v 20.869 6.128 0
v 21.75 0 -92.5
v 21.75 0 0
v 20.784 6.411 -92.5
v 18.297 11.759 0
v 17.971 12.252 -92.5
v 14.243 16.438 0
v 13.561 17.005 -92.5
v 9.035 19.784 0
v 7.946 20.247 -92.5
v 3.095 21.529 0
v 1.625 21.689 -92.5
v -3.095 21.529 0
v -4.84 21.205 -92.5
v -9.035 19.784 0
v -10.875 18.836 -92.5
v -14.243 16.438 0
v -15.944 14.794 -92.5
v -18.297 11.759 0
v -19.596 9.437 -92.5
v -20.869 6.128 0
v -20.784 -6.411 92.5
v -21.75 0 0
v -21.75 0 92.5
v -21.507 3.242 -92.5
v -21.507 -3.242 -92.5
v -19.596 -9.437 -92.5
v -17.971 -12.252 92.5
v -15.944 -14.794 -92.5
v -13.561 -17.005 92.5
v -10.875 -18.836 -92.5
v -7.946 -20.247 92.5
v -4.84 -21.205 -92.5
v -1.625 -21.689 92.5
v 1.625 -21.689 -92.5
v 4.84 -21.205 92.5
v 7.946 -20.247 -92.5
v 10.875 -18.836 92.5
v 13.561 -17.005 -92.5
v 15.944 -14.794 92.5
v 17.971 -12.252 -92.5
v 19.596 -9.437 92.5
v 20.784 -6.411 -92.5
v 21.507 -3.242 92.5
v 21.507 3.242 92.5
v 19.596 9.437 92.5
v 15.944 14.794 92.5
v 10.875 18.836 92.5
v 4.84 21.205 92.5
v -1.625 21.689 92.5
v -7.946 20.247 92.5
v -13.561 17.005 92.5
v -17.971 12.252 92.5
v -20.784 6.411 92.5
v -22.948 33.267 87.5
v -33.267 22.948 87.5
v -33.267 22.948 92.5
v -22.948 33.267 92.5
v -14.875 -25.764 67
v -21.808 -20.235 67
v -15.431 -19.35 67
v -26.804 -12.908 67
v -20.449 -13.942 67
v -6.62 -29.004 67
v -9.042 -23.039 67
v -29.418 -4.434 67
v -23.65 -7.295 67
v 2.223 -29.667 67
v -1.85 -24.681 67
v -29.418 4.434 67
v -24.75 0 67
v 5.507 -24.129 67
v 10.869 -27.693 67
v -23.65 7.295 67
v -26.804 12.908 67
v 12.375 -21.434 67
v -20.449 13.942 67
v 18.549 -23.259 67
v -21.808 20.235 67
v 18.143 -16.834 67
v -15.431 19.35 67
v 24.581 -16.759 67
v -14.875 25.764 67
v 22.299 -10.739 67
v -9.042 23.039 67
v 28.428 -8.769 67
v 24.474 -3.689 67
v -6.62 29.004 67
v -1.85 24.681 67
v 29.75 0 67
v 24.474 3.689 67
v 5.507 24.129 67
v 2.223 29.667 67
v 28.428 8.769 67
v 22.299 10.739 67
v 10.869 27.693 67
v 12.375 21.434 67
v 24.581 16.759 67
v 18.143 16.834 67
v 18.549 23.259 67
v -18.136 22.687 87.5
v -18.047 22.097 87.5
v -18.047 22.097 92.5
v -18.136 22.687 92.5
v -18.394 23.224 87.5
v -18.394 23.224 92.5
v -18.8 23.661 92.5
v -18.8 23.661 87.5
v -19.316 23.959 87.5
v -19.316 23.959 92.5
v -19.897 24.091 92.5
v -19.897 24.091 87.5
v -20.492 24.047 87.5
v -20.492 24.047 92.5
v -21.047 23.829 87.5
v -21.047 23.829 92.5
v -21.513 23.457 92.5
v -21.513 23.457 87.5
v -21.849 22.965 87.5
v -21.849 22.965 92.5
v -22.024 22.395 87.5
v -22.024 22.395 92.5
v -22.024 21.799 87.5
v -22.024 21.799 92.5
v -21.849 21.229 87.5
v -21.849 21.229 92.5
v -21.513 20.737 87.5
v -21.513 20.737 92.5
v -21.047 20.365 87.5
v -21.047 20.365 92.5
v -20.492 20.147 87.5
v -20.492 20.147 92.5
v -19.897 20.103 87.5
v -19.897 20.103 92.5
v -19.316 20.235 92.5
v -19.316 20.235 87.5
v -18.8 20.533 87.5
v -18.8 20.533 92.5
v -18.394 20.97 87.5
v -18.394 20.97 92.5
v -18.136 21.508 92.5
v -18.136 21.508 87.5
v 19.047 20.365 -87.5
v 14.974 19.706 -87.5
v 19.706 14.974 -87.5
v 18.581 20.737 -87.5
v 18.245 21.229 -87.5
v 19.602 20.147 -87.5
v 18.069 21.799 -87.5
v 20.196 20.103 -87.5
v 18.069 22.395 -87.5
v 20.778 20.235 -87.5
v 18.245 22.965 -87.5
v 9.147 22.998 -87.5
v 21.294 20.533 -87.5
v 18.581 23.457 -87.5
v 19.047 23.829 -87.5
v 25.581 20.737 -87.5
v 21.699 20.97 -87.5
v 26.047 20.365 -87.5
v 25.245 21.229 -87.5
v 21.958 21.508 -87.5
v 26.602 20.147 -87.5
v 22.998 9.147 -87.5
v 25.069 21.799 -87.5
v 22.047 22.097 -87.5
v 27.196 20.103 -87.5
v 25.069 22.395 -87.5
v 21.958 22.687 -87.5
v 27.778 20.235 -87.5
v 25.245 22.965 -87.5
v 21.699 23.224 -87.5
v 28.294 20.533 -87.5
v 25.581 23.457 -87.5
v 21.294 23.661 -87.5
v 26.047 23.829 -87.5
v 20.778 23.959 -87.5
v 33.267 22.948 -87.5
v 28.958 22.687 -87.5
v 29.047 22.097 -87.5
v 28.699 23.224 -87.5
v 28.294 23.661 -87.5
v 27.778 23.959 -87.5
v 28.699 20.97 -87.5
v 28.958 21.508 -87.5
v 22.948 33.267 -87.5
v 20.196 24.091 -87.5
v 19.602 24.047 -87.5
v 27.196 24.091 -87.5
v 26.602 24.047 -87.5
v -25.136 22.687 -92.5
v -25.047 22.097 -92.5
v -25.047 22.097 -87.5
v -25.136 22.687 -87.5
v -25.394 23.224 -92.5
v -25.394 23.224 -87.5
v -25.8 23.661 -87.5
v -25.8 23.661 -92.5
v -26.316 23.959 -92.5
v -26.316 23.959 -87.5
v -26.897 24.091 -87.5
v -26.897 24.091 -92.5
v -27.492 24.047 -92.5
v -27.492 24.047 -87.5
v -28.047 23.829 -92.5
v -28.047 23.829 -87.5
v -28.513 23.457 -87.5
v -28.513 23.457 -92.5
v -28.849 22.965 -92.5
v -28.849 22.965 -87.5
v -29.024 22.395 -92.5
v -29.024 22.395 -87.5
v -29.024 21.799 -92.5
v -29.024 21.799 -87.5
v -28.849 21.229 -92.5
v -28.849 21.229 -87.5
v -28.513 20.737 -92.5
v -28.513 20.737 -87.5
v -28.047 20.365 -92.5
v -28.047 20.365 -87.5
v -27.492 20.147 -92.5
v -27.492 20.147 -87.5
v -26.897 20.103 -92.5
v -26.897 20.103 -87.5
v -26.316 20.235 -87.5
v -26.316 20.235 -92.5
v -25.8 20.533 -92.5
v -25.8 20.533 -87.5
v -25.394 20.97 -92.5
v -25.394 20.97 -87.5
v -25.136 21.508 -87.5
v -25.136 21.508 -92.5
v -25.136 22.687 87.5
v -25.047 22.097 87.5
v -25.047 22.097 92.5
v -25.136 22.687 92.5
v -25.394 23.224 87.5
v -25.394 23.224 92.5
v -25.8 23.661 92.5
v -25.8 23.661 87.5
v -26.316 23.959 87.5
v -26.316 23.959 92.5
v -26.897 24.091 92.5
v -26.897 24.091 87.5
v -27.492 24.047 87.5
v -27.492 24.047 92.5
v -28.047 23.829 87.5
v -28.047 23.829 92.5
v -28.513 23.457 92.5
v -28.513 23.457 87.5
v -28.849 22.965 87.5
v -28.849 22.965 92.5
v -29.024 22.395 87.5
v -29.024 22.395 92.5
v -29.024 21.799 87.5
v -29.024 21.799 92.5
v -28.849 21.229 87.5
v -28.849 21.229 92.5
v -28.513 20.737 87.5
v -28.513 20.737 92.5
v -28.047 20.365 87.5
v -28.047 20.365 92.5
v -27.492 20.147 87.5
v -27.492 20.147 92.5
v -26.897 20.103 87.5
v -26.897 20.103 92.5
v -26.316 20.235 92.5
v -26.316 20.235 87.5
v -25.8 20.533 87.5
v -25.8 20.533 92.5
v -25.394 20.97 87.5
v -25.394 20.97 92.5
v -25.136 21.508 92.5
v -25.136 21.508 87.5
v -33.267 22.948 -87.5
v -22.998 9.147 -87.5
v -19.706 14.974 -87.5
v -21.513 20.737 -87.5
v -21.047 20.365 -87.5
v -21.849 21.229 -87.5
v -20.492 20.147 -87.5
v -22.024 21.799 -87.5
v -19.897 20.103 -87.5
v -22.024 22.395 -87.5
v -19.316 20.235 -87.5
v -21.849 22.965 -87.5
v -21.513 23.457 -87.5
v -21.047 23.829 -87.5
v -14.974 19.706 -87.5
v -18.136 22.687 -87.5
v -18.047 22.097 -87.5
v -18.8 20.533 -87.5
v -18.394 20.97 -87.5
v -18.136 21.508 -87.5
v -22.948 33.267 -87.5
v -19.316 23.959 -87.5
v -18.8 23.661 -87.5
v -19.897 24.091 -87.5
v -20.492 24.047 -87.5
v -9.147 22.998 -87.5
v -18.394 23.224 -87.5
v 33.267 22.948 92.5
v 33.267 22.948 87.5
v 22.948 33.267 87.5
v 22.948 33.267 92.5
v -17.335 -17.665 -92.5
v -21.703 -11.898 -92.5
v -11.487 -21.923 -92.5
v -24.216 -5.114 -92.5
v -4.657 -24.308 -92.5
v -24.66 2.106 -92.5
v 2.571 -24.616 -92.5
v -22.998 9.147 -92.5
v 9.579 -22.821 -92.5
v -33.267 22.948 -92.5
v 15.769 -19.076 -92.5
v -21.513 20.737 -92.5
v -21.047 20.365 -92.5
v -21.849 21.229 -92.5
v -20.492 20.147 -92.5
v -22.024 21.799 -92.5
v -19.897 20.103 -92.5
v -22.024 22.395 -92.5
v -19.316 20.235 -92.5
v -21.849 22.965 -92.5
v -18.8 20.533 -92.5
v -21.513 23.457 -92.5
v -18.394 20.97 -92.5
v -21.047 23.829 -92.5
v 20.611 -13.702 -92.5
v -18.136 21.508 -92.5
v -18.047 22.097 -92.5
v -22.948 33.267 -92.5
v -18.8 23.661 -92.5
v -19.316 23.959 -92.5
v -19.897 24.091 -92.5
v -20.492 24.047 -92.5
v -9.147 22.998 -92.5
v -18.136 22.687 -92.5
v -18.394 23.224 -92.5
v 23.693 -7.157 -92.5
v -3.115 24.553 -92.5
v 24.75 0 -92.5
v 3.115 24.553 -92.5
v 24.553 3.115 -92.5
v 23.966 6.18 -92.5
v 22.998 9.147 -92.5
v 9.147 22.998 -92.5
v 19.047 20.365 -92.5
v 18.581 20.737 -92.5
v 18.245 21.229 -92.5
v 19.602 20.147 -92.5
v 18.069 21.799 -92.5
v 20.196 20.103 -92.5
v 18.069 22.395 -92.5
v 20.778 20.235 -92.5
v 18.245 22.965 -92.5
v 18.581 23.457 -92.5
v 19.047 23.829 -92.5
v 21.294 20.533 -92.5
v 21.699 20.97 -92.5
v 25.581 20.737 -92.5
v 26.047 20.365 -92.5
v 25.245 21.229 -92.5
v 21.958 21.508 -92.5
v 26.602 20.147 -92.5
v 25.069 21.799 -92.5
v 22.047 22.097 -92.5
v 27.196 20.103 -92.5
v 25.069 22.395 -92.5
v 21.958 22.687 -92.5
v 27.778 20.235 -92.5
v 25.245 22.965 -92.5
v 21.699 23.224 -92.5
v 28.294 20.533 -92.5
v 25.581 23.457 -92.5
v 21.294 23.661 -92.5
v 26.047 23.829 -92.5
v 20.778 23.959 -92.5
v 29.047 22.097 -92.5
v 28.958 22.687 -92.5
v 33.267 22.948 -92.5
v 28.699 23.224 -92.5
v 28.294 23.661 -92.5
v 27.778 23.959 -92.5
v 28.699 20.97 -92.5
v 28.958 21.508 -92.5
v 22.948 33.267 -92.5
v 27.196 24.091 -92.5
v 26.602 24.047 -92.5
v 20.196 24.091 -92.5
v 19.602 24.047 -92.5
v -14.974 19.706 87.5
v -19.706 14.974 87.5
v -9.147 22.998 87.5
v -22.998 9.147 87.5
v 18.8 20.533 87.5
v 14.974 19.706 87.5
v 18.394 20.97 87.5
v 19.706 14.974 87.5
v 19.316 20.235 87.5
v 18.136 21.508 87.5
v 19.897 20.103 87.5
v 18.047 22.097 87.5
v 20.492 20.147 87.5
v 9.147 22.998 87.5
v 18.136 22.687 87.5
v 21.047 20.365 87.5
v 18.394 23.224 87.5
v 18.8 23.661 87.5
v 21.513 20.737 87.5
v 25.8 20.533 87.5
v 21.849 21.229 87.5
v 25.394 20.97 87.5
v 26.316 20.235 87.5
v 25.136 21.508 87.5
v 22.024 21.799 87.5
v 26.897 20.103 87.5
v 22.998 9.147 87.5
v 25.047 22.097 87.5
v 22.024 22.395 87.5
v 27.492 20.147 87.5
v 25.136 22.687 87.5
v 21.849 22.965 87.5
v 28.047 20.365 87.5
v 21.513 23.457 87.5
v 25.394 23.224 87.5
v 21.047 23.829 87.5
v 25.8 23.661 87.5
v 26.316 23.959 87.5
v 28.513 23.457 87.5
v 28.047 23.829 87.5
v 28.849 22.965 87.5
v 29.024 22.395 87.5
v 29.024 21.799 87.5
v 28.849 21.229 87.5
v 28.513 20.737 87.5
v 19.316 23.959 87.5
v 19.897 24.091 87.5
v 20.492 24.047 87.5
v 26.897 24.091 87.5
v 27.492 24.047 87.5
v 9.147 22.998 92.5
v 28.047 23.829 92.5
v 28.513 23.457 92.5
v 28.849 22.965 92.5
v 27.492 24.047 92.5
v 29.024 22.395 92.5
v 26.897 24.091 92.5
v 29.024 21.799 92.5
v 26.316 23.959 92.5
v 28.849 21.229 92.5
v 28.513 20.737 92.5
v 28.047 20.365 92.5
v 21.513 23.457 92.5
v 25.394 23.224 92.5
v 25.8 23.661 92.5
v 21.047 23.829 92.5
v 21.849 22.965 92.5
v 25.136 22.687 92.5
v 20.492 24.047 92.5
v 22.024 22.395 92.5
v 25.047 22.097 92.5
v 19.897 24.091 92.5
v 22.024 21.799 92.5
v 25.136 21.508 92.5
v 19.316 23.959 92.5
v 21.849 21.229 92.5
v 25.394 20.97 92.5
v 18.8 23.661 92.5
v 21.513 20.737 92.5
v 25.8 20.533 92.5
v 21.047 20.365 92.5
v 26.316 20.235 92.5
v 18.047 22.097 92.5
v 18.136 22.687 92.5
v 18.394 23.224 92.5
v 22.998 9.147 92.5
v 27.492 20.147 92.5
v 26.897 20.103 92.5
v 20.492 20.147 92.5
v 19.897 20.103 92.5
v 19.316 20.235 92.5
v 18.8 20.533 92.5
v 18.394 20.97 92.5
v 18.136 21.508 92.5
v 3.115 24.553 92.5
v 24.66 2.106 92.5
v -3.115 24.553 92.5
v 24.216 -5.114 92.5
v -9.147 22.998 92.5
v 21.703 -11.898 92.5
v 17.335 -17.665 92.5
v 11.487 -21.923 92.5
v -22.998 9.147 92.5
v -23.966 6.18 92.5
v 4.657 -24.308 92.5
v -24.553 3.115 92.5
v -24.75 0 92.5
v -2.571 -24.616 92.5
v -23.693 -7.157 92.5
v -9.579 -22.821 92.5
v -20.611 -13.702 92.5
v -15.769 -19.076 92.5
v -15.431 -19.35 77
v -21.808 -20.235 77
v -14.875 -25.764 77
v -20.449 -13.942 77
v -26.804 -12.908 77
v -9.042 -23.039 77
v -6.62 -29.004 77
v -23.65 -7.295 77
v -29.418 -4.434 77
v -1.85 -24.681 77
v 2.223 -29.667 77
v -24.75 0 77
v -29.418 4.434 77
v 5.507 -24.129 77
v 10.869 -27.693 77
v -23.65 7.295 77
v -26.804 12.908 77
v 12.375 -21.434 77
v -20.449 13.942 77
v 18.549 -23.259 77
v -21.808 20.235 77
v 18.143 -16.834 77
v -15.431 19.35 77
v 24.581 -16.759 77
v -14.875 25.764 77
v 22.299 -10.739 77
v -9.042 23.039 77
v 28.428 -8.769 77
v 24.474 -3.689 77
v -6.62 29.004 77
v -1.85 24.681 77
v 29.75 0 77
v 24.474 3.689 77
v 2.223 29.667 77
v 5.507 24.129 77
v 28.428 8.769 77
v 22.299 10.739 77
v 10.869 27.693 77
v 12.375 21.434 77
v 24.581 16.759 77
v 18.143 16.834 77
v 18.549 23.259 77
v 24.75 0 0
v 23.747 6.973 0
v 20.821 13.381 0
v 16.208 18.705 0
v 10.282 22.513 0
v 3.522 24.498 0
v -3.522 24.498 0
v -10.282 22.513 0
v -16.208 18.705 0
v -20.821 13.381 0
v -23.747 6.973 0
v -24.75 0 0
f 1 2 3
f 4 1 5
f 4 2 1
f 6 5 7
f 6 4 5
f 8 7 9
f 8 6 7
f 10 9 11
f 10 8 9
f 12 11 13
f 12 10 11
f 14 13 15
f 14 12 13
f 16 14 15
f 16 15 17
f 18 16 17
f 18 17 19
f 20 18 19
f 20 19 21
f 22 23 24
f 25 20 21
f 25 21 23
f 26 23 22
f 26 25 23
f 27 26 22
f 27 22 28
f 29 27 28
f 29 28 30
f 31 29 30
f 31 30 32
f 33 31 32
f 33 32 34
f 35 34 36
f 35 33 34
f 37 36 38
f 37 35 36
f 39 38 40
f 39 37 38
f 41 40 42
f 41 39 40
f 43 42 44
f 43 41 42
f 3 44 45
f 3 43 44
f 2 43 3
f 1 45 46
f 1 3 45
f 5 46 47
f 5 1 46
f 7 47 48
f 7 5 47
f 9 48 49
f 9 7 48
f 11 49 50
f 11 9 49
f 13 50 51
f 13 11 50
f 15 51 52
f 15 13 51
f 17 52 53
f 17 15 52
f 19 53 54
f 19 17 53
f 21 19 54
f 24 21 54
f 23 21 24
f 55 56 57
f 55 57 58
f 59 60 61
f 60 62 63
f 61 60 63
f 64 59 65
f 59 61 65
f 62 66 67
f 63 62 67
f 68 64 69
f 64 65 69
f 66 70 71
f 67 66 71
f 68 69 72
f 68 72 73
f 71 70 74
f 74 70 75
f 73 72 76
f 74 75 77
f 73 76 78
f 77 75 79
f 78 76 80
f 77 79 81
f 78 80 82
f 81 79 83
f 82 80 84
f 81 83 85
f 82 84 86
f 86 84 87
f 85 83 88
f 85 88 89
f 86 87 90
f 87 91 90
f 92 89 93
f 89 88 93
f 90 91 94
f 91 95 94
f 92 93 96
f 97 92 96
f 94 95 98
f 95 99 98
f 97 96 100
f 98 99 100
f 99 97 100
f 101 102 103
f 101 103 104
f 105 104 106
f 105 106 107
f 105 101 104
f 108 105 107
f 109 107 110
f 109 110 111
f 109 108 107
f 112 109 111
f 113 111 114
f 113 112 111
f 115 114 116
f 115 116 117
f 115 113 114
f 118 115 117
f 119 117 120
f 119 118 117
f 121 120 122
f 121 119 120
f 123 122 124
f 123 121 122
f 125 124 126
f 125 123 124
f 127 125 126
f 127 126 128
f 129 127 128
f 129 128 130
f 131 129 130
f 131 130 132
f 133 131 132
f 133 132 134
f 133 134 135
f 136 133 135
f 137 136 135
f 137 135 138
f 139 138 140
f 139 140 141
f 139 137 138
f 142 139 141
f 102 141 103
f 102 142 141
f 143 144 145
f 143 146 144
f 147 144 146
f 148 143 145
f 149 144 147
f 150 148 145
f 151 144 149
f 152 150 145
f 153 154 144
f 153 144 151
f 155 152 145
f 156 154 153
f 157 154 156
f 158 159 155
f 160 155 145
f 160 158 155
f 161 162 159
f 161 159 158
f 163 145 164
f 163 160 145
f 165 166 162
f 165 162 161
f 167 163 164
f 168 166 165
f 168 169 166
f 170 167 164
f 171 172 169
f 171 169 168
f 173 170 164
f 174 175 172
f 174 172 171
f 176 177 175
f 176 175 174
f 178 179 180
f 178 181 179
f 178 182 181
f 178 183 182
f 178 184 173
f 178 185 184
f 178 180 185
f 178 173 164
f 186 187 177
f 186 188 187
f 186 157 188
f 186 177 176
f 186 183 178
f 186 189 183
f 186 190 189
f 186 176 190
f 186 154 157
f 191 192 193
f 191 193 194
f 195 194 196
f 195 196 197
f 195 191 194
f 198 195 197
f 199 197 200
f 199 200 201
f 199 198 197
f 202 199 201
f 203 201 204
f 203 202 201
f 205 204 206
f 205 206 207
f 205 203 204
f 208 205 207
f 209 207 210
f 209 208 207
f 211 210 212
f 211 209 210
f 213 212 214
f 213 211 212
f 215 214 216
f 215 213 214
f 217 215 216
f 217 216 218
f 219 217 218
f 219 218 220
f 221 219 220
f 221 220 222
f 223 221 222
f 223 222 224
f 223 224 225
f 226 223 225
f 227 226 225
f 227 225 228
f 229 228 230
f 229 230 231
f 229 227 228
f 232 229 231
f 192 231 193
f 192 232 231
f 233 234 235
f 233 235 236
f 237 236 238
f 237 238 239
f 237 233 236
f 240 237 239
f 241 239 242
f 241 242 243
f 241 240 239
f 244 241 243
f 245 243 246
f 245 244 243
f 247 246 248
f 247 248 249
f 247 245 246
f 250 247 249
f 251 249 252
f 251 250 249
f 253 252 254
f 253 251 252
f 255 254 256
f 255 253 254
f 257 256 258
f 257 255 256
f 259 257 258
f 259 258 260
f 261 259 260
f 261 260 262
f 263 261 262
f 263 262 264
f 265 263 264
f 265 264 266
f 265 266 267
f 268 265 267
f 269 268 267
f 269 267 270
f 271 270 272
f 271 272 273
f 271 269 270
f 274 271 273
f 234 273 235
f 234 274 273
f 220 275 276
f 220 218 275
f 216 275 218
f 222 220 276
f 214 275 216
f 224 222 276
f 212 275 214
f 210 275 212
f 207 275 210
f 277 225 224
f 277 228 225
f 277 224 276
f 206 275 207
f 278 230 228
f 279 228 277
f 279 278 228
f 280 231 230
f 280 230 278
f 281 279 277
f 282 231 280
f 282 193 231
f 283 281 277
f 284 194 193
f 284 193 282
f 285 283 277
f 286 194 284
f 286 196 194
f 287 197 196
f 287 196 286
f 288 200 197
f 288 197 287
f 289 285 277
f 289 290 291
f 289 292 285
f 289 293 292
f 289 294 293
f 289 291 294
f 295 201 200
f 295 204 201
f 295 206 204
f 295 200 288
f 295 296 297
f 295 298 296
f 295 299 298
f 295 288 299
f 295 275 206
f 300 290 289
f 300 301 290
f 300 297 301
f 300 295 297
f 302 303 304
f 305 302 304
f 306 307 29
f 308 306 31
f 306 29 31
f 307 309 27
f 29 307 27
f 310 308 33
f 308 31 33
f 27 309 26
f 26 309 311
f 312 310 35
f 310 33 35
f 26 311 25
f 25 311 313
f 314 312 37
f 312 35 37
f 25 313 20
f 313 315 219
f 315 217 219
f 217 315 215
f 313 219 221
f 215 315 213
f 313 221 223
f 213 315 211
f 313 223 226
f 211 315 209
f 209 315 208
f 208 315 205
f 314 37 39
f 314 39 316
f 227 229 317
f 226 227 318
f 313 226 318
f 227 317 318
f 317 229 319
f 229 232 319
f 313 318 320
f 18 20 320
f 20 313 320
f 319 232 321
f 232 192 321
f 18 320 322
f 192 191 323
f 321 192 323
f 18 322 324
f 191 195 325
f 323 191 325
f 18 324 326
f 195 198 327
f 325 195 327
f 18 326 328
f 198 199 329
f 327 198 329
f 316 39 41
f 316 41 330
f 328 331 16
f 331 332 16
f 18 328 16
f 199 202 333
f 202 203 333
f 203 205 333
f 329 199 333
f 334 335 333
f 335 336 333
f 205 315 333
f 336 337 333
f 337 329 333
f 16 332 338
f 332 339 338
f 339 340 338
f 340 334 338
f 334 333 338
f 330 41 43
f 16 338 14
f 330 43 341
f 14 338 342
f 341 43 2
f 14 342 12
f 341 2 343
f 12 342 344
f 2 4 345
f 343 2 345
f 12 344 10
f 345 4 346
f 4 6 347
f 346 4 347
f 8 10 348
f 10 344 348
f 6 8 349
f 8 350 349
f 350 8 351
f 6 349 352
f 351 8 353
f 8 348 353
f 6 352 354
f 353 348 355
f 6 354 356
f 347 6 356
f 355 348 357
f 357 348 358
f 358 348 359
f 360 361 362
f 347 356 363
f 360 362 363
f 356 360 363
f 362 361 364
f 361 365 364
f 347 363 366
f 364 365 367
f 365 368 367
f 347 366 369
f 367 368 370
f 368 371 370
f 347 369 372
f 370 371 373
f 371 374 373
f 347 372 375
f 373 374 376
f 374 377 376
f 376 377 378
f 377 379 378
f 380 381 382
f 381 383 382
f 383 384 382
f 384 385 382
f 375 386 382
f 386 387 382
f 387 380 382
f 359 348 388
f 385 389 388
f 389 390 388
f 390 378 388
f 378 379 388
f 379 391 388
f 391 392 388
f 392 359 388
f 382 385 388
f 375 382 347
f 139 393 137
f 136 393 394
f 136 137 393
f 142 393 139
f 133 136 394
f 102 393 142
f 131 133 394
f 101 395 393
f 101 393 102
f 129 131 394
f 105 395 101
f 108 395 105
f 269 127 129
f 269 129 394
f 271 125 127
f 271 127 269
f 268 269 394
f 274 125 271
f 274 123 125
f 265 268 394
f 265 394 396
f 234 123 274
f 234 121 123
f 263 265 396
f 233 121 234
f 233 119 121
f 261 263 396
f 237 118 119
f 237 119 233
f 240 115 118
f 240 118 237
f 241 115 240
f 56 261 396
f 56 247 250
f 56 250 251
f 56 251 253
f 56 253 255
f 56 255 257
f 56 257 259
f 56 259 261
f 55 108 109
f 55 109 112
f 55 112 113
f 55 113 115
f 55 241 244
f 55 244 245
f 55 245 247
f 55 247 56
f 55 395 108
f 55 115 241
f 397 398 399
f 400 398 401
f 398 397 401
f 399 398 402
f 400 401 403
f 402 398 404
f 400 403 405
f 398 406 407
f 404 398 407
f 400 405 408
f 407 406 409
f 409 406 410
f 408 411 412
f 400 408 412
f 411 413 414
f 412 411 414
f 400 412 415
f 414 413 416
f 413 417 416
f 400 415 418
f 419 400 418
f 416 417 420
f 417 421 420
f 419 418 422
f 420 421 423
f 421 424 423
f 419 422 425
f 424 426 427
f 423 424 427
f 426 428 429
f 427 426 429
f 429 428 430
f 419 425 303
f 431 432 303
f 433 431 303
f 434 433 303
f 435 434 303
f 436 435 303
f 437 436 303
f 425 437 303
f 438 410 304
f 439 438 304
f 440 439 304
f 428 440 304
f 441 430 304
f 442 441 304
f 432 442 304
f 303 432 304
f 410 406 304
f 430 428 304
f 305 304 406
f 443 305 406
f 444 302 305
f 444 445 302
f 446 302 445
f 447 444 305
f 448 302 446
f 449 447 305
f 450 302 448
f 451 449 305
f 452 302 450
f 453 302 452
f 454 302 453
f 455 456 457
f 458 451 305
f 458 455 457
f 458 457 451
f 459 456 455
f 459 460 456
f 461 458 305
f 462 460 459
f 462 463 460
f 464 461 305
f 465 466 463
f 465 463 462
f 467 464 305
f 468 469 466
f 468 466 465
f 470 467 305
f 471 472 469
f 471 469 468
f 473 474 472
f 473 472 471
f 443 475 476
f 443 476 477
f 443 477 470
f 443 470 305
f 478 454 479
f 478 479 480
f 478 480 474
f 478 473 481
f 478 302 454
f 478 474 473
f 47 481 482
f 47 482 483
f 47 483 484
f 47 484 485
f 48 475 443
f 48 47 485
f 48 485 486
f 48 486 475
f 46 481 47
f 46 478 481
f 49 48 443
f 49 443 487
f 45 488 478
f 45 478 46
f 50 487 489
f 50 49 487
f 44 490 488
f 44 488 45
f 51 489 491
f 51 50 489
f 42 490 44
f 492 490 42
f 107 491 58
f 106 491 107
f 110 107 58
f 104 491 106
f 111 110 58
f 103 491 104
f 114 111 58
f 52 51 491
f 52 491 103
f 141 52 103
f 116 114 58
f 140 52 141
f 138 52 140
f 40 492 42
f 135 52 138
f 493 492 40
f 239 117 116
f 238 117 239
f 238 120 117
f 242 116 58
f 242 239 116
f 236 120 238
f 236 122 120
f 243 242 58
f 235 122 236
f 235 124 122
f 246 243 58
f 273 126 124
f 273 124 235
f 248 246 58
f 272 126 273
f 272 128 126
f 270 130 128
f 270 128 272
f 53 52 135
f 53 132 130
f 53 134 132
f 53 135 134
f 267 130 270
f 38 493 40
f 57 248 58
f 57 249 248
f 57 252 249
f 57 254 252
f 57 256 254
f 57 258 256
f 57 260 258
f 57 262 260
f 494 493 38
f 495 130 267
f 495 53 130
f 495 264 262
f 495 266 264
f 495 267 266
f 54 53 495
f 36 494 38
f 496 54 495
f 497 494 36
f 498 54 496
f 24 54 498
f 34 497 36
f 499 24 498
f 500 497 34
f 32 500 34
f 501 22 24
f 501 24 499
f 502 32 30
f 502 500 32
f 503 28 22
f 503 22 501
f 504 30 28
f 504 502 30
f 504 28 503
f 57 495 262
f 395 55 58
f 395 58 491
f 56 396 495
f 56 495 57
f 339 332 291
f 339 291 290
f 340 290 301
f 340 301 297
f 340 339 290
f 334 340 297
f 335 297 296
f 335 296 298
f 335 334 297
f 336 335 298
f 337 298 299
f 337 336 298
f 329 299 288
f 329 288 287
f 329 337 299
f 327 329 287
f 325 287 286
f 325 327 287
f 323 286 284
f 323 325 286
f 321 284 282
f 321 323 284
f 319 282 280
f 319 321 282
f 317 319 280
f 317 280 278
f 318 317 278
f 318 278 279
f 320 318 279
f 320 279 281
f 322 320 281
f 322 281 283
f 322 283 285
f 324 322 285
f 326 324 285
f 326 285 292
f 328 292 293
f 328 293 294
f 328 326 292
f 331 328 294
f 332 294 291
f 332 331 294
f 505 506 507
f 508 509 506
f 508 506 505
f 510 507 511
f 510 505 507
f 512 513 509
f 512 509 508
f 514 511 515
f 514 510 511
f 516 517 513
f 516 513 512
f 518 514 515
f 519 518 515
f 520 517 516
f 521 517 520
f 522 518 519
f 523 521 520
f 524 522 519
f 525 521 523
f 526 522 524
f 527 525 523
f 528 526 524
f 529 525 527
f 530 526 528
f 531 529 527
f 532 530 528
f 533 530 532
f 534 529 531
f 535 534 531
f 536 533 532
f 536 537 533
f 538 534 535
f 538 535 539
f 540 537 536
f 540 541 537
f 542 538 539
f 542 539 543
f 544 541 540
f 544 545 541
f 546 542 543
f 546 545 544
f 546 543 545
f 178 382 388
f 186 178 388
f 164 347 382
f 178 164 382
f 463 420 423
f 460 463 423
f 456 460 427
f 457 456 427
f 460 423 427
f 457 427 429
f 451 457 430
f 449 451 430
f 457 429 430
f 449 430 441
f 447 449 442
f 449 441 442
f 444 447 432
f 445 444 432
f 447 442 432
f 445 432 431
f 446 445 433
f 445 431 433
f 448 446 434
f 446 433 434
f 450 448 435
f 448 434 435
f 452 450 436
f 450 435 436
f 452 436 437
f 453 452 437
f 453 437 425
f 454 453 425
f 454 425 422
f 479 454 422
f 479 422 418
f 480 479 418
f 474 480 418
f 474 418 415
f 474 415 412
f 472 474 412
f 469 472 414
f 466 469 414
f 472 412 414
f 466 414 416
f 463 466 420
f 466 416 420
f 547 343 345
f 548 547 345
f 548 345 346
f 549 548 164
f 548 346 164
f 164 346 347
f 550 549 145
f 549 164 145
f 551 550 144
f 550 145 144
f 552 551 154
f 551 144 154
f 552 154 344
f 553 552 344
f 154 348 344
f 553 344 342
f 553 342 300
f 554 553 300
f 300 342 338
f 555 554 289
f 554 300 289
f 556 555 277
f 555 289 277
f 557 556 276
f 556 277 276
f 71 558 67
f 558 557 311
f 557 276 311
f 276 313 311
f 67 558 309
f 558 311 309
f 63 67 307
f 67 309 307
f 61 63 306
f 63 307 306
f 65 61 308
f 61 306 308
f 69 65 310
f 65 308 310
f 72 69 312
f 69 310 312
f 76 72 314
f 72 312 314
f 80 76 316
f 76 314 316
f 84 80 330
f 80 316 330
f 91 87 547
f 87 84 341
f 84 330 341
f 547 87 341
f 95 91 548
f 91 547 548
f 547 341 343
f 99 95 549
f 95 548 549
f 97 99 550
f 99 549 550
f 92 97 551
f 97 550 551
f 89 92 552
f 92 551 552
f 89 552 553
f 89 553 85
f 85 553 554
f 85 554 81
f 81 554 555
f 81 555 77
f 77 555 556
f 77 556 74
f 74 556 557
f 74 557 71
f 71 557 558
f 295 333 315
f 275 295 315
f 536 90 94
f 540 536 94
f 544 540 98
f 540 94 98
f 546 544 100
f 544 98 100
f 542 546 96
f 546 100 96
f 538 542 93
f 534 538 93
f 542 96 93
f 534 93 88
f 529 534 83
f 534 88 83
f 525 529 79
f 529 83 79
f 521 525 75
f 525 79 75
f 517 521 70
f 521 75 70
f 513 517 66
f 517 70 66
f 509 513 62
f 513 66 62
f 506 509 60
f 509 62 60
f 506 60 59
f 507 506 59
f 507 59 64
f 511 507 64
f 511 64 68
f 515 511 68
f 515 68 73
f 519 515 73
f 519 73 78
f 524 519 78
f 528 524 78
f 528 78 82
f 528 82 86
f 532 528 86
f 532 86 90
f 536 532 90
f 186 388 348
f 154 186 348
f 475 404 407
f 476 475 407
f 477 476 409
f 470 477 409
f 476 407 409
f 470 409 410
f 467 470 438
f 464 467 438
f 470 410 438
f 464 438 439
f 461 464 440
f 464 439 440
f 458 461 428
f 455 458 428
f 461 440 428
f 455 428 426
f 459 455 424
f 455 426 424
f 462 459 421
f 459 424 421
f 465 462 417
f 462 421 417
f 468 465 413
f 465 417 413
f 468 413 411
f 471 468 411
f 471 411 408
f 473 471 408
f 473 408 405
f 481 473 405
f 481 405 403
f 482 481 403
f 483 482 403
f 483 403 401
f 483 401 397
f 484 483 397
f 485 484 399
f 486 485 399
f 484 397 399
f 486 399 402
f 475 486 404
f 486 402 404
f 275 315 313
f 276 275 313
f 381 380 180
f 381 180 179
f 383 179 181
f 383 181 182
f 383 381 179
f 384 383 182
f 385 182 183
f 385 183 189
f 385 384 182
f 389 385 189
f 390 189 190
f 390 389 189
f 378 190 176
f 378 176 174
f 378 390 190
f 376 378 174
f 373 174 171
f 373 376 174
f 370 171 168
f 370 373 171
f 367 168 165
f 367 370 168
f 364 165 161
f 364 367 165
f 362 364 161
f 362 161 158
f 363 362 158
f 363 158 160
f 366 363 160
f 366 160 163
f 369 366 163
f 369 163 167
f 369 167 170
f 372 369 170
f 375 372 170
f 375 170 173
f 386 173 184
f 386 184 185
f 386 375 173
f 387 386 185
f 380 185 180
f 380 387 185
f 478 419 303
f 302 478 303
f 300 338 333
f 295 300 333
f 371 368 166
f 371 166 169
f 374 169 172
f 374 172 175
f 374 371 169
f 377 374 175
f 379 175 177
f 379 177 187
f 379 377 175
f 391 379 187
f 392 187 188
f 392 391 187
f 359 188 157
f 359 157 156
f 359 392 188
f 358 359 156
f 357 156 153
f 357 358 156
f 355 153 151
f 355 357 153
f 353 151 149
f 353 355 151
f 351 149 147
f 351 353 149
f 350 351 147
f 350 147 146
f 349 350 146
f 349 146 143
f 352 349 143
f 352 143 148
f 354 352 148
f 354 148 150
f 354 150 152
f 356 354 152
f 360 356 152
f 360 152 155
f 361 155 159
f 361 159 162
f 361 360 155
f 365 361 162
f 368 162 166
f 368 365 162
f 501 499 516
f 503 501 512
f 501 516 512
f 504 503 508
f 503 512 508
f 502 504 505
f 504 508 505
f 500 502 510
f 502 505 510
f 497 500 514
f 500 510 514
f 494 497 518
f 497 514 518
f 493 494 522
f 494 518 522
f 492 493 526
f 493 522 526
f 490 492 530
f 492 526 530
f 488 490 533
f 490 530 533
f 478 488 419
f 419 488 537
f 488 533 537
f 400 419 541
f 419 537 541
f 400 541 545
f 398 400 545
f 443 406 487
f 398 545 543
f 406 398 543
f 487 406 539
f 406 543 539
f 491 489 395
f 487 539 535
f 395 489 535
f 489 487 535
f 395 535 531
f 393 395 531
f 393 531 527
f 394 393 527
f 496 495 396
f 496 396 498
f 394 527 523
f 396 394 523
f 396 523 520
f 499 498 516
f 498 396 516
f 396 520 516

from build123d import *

# Parameters (mm, degrees)
SKETCH1_R             = 24.75
SKETCH1_R_2           = 21.75
BOSS_EXTRUDE1_DEPTH   = 90
BOSS_EXTRUDE3_START   = 72
SKETCH5_R             = 29.75
SKETCH5_R_2           = 21.75
BOSS_EXTRUDE3_DEPTH   = 5
SKETCH7_R             = 24.75
SKETCH7_R_2           = 21.75
BOSS_EXTRUDE4_DEPTH   = 2.5
BOSS_EXTRUDE5_START   = -5
SKETCH6_R             = 2
BOSS_EXTRUDE5_DEPTH   = 5
MIRROR2_START         = -92.5
MIRROR2_OUTLINE_R     = 24.75
MIRROR2_OUTLINE_R_2   = 21.75
MIRROR2_DEPTH         = 92.5
MIRROR2_START_2       = 67
MIRROR2_2_OUTLINE_R   = 29.75
MIRROR2_2_OUTLINE_R_2 = 24.75
MIRROR2_2_DEPTH       = 5
MIRROR2_3_OUTLINE_R   = 2
MIRROR2_3_DEPTH       = 5


# Read off the part's stored shape, not the designer's step: Mirror2
with BuildPart() as part:
    # Sketch1 → Boss-Extrude1 (new body)
    with BuildSketch(Plane.XY):
        with Locations(Location((0, 0, 0), (0, 0, 180))):
            Circle(SKETCH1_R)
        with Locations(Location((0, 0, 0), (0, 0, 180))):
            Circle(SKETCH1_R_2, mode=Mode.SUBTRACT)
    extrude(amount=BOSS_EXTRUDE1_DEPTH)

    # Sketch5 → Boss-Extrude3 (add)
    with BuildSketch(Plane.XY.offset(BOSS_EXTRUDE3_START)):
        Circle(SKETCH5_R)
        with Locations(Location((0, 0, 0), (0, 0, 180))):
            Circle(SKETCH5_R_2, mode=Mode.SUBTRACT)
    extrude(amount=BOSS_EXTRUDE3_DEPTH)

    # Sketch7 → Boss-Extrude4 (add, symmetric)
    with BuildSketch(Plane.XY.offset(90)):
        with Locations(Location((0, 0, 0), (0, 0, 180))):
            Circle(SKETCH7_R)
        with Locations(Location((0, 0, 0), (0, 0, 180))):
            Circle(SKETCH7_R_2, mode=Mode.SUBTRACT)
    extrude(amount=BOSS_EXTRUDE4_DEPTH, both=True)

    # Sketch6 → Boss-Extrude5 (add)
    with BuildSketch(Plane.XY.offset(92.5).offset(BOSS_EXTRUDE5_START)):
        with BuildLine():
            Line((-22.997666259, 9.147122314), (-33.267406372, 22.947582732))
            Line((-33.267406372, 22.947582732), (-22.947582732, 33.267406372))
            Line((-22.947582732, 33.267406372), (-9.147122314, 22.997666259))
            ThreePointArc((-9.147122314, 22.997666259), (-17.500892834, 17.500892834), (-22.997666259, 9.147122314))
        make_face()
        with Locations((-20.04683438, 22.097086912)):
            Circle(SKETCH6_R, mode=Mode.SUBTRACT)
        with Locations((-27.04683438, 22.097086912)):
            Circle(SKETCH6_R, mode=Mode.SUBTRACT)
    boss_extrude5 = extrude(amount=BOSS_EXTRUDE5_DEPTH)

    # Mirror1: Boss-Extrude5 across plane
    add(boss_extrude5.mirror(Plane(origin=(0, 0, 0), x_dir=(0, 0, 1), z_dir=(1, 0, 0))))

    # Mirror2 outline → Mirror2 (add)
    with BuildSketch(Plane.XY.offset(MIRROR2_START)):
        Circle(MIRROR2_OUTLINE_R)
        Circle(MIRROR2_OUTLINE_R_2, mode=Mode.SUBTRACT)
    extrude(amount=MIRROR2_DEPTH)

    # Mirror2 2 outline → Mirror2 2 (add)
    with BuildSketch(Plane.XY.offset(MIRROR2_START_2)):
        Circle(MIRROR2_2_OUTLINE_R)
        Circle(MIRROR2_2_OUTLINE_R_2, mode=Mode.SUBTRACT)
    extrude(amount=MIRROR2_2_DEPTH)

    # Mirror2 3 outline → Mirror2 3 (add)
    # profile 1 of 2: a face of its own
    with BuildSketch(Plane.XY.offset(MIRROR2_START)):
        with BuildLine():
            ThreePointArc((9.147122314, 22.997666259), (17.500892834, 17.500892834), (22.997666259, 9.147122314))
            Line((22.997666259, 9.147122314), (33.267406372, 22.947582732))
            Line((33.267406372, 22.947582732), (22.947582732, 33.267406372))
            Line((22.947582732, 33.267406372), (9.147122314, 22.997666259))
        make_face()
        with Locations((20.04683438, 22.097086912)):
            Circle(MIRROR2_3_OUTLINE_R, mode=Mode.SUBTRACT)
        with Locations((27.04683438, 22.097086912)):
            Circle(MIRROR2_3_OUTLINE_R, mode=Mode.SUBTRACT)
    # profile 2 of 2: a face of its own
    with BuildSketch(Plane.XY.offset(MIRROR2_START)):
        with BuildLine():
            ThreePointArc((-22.997666259, 9.147122314), (-17.500892834, 17.500892834), (-9.147122314, 22.997666259))
            Line((-9.147122314, 22.997666259), (-22.947582732, 33.267406372))
            Line((-22.947582732, 33.267406372), (-33.267406372, 22.947582732))
            Line((-33.267406372, 22.947582732), (-22.997666259, 9.147122314))
        make_face()
        with Locations((-20.04683438, 22.097086912)):
            Circle(MIRROR2_3_OUTLINE_R, mode=Mode.SUBTRACT)
        with Locations((-27.04683438, 22.097086912)):
            Circle(MIRROR2_3_OUTLINE_R, mode=Mode.SUBTRACT)
    extrude(amount=MIRROR2_3_DEPTH)


solid = part.part
